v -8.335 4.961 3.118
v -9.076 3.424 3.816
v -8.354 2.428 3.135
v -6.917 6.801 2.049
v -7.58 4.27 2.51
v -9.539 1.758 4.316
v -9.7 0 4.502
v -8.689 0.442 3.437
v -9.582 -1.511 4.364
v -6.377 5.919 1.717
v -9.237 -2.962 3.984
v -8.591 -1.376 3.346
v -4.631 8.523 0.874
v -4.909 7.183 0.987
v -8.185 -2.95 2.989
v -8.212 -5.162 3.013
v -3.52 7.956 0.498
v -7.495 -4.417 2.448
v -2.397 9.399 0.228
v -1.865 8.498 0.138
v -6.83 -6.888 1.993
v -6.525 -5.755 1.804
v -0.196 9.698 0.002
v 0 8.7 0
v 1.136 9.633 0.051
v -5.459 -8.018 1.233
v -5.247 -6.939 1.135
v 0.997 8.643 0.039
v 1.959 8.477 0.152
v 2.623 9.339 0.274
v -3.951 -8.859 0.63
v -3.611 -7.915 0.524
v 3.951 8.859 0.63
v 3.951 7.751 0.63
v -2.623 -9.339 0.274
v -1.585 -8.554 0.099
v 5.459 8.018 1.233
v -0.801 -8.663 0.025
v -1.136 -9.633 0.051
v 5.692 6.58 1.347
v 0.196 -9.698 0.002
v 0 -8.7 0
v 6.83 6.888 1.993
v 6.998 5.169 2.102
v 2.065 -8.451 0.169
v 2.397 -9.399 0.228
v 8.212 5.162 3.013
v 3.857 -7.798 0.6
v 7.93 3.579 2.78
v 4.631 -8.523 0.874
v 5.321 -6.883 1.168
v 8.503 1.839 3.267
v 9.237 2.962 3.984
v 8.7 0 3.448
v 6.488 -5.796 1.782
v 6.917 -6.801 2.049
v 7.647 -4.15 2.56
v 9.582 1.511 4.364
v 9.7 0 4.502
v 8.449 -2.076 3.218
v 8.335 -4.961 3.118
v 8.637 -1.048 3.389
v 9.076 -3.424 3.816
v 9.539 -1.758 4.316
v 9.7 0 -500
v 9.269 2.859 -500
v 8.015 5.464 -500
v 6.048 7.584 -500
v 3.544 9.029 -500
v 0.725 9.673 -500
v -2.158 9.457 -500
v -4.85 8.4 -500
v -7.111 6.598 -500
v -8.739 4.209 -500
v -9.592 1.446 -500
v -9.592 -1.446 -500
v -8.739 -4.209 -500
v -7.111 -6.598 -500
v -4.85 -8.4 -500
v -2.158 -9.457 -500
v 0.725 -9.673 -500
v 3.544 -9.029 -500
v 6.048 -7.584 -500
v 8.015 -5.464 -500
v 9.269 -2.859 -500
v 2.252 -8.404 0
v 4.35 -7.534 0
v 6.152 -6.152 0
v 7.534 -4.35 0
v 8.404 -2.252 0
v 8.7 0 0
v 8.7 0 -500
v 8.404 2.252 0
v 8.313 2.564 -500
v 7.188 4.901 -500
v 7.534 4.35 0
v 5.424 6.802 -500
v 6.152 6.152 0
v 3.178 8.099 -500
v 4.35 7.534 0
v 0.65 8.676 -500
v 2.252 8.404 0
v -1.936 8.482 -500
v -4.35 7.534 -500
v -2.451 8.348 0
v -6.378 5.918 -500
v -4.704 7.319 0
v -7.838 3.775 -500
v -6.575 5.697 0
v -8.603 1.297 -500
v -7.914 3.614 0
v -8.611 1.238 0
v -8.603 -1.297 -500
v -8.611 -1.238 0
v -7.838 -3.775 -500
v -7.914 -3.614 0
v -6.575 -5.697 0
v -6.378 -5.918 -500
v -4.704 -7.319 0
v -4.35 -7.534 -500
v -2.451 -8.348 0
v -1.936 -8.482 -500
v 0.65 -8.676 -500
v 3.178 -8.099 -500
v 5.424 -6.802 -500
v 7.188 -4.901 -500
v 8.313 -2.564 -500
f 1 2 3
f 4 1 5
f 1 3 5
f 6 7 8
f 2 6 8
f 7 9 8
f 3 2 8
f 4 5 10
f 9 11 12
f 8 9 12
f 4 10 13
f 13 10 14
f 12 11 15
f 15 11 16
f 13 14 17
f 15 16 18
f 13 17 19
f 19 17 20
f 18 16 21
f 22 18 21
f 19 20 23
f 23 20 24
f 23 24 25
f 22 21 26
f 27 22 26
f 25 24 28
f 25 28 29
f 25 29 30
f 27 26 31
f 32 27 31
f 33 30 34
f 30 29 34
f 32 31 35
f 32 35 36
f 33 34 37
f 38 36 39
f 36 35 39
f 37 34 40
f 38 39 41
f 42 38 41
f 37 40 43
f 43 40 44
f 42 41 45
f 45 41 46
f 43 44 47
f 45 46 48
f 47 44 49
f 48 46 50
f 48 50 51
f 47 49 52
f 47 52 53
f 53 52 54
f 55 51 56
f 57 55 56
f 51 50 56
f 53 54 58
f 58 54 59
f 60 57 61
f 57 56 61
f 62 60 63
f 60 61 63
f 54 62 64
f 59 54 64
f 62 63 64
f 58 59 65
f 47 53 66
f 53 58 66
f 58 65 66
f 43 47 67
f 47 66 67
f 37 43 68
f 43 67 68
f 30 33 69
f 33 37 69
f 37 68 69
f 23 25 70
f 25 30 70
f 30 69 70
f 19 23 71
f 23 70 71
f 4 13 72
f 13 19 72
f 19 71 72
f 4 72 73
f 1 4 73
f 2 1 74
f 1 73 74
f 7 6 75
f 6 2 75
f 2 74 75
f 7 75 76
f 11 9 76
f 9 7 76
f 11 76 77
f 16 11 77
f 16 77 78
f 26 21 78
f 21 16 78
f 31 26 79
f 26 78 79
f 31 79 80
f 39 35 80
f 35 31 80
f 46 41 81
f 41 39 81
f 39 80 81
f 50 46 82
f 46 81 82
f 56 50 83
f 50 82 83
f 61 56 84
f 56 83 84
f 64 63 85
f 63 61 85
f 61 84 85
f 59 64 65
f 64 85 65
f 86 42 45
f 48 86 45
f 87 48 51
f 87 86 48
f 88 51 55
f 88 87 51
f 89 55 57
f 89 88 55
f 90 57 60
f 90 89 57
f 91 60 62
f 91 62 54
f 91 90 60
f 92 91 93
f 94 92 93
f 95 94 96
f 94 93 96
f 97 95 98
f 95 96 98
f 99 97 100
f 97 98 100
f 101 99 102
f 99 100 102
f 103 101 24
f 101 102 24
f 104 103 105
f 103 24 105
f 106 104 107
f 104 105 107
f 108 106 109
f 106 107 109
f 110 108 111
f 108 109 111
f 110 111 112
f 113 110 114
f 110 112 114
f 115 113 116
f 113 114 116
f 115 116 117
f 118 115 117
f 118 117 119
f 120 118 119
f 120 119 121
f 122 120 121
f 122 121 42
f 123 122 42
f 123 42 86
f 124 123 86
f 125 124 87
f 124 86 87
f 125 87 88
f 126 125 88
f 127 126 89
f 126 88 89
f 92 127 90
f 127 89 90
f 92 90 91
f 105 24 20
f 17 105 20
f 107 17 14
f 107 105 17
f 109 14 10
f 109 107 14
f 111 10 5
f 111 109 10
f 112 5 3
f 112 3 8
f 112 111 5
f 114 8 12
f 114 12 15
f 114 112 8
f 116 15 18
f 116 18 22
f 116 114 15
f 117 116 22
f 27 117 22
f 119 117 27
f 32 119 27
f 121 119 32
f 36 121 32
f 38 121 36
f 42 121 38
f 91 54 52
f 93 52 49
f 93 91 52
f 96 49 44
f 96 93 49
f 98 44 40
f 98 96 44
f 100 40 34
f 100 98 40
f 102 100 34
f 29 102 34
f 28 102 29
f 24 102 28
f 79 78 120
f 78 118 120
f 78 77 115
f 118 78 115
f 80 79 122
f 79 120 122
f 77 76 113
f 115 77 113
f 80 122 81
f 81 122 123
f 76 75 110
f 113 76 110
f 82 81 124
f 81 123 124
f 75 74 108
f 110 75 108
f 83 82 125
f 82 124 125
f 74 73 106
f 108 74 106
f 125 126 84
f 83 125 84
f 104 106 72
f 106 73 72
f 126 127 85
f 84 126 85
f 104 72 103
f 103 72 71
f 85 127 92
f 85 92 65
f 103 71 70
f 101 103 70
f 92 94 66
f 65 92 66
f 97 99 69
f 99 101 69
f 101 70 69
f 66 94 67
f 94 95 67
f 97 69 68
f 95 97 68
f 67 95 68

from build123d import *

# Parameters (mm, degrees)
F0_R     = 9.7
F0_R_2   = 8.7
F1_DEPTH = 500
F3_DEPTH = 10
F4_DEPTH = 12.5


with BuildPart() as f1:
    # F0 (on Top) → F1 (new body)
    with BuildSketch(Plane.XY):
        Circle(F0_R)
        Circle(F0_R_2, mode=Mode.SUBTRACT)
    extrude(amount=-F1_DEPTH)

    # F0 (on Top) → F3 (join)
    with BuildSketch(Plane.XY):
        Circle(F0_R)
        Circle(F0_R_2, mode=Mode.SUBTRACT)
    extrude(amount=F3_DEPTH)

    # F2 (on Front) → F4 (cut, symmetric)
    with BuildSketch(Plane.XZ):
        with BuildLine():
            Line((-9.7, 10), (-9.7, 4.502439))
            ThreePointArc((-9.7, 4.502439), (0, 0), (9.7, 4.502439))
            Line((9.7, 4.502439), (9.7, 10))
            Line((9.7, 10), (-9.7, 10))
        make_face()
    extrude(amount=F4_DEPTH, both=True, mode=Mode.SUBTRACT)


solid = f1.part
